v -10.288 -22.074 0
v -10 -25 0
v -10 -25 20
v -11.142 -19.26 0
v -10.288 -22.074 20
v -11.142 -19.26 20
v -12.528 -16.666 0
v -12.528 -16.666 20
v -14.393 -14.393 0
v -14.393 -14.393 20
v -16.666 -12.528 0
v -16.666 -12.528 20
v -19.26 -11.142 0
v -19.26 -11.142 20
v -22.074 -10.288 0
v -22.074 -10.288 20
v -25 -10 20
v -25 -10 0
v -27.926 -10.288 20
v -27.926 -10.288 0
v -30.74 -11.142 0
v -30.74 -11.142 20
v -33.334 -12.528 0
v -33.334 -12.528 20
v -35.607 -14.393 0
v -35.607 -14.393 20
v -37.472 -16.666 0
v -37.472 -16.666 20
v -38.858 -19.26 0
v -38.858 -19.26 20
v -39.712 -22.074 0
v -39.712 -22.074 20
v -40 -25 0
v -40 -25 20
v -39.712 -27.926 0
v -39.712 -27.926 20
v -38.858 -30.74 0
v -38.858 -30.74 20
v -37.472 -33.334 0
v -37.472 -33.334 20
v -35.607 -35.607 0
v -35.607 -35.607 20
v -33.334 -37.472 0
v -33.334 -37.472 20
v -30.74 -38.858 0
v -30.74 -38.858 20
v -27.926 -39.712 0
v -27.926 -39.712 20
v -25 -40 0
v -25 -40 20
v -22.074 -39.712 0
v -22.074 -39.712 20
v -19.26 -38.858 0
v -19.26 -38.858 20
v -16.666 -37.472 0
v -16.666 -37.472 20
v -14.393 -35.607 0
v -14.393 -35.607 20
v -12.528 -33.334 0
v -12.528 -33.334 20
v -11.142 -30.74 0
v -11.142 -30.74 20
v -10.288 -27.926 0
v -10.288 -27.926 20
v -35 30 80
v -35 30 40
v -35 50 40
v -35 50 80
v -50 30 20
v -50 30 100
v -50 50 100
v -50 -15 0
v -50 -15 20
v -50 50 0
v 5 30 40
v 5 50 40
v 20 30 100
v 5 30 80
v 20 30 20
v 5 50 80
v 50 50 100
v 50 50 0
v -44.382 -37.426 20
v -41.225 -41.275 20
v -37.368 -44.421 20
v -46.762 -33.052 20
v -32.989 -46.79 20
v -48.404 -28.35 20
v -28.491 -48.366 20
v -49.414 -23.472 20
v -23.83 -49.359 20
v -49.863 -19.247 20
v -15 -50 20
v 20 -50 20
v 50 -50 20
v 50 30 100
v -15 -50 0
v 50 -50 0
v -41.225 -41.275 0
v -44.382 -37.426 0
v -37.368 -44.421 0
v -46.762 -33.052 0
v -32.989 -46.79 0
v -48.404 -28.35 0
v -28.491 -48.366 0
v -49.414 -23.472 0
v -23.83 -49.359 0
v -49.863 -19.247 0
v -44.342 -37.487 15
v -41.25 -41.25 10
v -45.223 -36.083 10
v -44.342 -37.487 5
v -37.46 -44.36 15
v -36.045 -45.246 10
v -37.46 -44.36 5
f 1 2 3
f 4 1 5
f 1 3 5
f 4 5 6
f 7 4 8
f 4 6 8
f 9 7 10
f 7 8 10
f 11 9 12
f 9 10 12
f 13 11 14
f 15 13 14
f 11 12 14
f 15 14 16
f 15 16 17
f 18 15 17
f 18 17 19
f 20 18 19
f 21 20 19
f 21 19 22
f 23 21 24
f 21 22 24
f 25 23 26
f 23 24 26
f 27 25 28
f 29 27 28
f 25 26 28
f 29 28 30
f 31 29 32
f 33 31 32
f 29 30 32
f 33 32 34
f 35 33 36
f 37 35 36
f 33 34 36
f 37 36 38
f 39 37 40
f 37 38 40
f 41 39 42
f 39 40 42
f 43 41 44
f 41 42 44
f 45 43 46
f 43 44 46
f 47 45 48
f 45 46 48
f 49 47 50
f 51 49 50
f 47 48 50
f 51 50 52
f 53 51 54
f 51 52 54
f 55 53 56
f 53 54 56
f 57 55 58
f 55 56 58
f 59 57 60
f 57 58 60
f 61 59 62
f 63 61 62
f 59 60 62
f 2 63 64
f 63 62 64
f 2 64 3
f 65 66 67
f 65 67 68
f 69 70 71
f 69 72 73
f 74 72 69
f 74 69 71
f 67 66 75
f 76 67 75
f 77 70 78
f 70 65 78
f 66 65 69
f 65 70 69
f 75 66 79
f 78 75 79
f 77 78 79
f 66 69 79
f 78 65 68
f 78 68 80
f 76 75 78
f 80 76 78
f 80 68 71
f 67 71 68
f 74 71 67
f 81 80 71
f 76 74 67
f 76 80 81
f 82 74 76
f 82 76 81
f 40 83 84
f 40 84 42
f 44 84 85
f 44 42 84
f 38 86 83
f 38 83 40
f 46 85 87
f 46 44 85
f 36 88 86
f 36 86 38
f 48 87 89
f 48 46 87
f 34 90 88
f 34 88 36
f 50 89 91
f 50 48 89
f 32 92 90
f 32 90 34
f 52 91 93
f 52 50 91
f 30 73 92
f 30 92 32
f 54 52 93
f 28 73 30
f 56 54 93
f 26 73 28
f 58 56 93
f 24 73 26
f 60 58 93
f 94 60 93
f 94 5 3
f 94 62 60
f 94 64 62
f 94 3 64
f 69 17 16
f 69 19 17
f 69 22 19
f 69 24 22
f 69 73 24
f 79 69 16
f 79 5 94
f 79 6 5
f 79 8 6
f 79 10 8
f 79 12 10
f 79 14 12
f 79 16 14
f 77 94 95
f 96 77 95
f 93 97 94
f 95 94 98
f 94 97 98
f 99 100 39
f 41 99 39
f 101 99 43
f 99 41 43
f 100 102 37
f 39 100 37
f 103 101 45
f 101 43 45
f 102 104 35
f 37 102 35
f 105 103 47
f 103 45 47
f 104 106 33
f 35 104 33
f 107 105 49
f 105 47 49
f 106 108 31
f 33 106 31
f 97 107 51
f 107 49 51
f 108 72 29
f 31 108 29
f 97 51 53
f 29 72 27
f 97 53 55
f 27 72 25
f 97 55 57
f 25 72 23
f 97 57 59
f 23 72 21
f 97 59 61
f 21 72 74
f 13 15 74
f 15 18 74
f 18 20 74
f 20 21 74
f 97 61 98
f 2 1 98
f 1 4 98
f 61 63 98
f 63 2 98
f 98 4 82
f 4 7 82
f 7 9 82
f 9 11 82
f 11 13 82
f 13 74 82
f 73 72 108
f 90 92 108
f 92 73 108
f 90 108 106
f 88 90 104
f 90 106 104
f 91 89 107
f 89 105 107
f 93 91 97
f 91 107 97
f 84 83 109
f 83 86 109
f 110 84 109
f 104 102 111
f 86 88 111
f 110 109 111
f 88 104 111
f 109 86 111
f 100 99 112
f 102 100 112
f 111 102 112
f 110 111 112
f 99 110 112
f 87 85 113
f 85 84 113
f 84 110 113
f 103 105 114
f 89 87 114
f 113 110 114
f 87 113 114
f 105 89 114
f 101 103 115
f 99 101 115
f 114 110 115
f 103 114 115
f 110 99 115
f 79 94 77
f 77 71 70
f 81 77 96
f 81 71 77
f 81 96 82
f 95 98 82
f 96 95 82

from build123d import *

# Parameters (mm, degrees)
F0_W        = 100
F0_H        = 100
F1_DEPTH    = 20
F2_W        = 100
F2_H        = 20
F3_DEPTH    = 80
F4_R        = 15
F5_DEPTH    = 20
F6_T1_DEPTH = 195
F7_W        = 30
F7_H        = 80
F8_DEPTH    = 80
F9_SIZE     = 80
F10_W       = 40
F10_H       = 40
F11_DEPTH   = 20


# Not quite as in the source:
# - a fillet or chamfer that OpenCascade refuses, or shapes differently, is made with other operations: its cross-section is extruded or revolved along the edge and cut away or added


with BuildPart() as f1:
    # F0 (on Top) → F1 (new body)
    with BuildSketch(Plane.XY):
        Rectangle(F0_W, F0_H)
    extrude(amount=F1_DEPTH)

    # F2 (on face) → F3 (join)
    with BuildSketch(Plane.XY.offset(20)):
        with Locations((0, 40)):
            Rectangle(F2_W, F2_H)
    extrude(amount=F3_DEPTH)

    # F4 (on face) → F5 (cut)
    with BuildSketch(Plane.XY.offset(20)):
        with Locations((-25, -25)):
            Circle(F4_R)
    extrude(amount=-F5_DEPTH, mode=Mode.SUBTRACT)

    # F6: fillet of radius 35 on 1 edges, made by hand

    # F6_s2 → F6_t1 (cut)
    with BuildSketch(Plane.XY.offset(-87.5)):
        with BuildLine():
            add(Edge.make_bspline(
                [(-50, -15), (-50, -50), (-15, -50)],
                knots=[0, 0, 0, 1, 1, 1], degree=2, weights=[1, 1, 1]))
            Line((-15, -50), (-50, -50))
            Line((-50, -50), (-50, -15))
        make_face()
    extrude(amount=F6_T1_DEPTH, mode=Mode.SUBTRACT)

    # F7 (on face) → F8 (join)
    with BuildSketch(Plane.XY.offset(20)):
        with Locations((35, -10)):
            Rectangle(F7_W, F7_H)
    extrude(amount=F8_DEPTH)

    # F9
    f9_edges = [f1.edges().sort_by_distance(p)[0] for p in [
        (35, -50, 100),
    ]]
    chamfer(f9_edges, length=F9_SIZE)

    # F10 (on face) → F11 (cut)
    with BuildSketch(Plane.XZ.offset(-30)):
        with Locations((-15, 60)):
            Rectangle(F10_W, F10_H)
    extrude(amount=-F11_DEPTH, mode=Mode.SUBTRACT)


solid = f1.part
